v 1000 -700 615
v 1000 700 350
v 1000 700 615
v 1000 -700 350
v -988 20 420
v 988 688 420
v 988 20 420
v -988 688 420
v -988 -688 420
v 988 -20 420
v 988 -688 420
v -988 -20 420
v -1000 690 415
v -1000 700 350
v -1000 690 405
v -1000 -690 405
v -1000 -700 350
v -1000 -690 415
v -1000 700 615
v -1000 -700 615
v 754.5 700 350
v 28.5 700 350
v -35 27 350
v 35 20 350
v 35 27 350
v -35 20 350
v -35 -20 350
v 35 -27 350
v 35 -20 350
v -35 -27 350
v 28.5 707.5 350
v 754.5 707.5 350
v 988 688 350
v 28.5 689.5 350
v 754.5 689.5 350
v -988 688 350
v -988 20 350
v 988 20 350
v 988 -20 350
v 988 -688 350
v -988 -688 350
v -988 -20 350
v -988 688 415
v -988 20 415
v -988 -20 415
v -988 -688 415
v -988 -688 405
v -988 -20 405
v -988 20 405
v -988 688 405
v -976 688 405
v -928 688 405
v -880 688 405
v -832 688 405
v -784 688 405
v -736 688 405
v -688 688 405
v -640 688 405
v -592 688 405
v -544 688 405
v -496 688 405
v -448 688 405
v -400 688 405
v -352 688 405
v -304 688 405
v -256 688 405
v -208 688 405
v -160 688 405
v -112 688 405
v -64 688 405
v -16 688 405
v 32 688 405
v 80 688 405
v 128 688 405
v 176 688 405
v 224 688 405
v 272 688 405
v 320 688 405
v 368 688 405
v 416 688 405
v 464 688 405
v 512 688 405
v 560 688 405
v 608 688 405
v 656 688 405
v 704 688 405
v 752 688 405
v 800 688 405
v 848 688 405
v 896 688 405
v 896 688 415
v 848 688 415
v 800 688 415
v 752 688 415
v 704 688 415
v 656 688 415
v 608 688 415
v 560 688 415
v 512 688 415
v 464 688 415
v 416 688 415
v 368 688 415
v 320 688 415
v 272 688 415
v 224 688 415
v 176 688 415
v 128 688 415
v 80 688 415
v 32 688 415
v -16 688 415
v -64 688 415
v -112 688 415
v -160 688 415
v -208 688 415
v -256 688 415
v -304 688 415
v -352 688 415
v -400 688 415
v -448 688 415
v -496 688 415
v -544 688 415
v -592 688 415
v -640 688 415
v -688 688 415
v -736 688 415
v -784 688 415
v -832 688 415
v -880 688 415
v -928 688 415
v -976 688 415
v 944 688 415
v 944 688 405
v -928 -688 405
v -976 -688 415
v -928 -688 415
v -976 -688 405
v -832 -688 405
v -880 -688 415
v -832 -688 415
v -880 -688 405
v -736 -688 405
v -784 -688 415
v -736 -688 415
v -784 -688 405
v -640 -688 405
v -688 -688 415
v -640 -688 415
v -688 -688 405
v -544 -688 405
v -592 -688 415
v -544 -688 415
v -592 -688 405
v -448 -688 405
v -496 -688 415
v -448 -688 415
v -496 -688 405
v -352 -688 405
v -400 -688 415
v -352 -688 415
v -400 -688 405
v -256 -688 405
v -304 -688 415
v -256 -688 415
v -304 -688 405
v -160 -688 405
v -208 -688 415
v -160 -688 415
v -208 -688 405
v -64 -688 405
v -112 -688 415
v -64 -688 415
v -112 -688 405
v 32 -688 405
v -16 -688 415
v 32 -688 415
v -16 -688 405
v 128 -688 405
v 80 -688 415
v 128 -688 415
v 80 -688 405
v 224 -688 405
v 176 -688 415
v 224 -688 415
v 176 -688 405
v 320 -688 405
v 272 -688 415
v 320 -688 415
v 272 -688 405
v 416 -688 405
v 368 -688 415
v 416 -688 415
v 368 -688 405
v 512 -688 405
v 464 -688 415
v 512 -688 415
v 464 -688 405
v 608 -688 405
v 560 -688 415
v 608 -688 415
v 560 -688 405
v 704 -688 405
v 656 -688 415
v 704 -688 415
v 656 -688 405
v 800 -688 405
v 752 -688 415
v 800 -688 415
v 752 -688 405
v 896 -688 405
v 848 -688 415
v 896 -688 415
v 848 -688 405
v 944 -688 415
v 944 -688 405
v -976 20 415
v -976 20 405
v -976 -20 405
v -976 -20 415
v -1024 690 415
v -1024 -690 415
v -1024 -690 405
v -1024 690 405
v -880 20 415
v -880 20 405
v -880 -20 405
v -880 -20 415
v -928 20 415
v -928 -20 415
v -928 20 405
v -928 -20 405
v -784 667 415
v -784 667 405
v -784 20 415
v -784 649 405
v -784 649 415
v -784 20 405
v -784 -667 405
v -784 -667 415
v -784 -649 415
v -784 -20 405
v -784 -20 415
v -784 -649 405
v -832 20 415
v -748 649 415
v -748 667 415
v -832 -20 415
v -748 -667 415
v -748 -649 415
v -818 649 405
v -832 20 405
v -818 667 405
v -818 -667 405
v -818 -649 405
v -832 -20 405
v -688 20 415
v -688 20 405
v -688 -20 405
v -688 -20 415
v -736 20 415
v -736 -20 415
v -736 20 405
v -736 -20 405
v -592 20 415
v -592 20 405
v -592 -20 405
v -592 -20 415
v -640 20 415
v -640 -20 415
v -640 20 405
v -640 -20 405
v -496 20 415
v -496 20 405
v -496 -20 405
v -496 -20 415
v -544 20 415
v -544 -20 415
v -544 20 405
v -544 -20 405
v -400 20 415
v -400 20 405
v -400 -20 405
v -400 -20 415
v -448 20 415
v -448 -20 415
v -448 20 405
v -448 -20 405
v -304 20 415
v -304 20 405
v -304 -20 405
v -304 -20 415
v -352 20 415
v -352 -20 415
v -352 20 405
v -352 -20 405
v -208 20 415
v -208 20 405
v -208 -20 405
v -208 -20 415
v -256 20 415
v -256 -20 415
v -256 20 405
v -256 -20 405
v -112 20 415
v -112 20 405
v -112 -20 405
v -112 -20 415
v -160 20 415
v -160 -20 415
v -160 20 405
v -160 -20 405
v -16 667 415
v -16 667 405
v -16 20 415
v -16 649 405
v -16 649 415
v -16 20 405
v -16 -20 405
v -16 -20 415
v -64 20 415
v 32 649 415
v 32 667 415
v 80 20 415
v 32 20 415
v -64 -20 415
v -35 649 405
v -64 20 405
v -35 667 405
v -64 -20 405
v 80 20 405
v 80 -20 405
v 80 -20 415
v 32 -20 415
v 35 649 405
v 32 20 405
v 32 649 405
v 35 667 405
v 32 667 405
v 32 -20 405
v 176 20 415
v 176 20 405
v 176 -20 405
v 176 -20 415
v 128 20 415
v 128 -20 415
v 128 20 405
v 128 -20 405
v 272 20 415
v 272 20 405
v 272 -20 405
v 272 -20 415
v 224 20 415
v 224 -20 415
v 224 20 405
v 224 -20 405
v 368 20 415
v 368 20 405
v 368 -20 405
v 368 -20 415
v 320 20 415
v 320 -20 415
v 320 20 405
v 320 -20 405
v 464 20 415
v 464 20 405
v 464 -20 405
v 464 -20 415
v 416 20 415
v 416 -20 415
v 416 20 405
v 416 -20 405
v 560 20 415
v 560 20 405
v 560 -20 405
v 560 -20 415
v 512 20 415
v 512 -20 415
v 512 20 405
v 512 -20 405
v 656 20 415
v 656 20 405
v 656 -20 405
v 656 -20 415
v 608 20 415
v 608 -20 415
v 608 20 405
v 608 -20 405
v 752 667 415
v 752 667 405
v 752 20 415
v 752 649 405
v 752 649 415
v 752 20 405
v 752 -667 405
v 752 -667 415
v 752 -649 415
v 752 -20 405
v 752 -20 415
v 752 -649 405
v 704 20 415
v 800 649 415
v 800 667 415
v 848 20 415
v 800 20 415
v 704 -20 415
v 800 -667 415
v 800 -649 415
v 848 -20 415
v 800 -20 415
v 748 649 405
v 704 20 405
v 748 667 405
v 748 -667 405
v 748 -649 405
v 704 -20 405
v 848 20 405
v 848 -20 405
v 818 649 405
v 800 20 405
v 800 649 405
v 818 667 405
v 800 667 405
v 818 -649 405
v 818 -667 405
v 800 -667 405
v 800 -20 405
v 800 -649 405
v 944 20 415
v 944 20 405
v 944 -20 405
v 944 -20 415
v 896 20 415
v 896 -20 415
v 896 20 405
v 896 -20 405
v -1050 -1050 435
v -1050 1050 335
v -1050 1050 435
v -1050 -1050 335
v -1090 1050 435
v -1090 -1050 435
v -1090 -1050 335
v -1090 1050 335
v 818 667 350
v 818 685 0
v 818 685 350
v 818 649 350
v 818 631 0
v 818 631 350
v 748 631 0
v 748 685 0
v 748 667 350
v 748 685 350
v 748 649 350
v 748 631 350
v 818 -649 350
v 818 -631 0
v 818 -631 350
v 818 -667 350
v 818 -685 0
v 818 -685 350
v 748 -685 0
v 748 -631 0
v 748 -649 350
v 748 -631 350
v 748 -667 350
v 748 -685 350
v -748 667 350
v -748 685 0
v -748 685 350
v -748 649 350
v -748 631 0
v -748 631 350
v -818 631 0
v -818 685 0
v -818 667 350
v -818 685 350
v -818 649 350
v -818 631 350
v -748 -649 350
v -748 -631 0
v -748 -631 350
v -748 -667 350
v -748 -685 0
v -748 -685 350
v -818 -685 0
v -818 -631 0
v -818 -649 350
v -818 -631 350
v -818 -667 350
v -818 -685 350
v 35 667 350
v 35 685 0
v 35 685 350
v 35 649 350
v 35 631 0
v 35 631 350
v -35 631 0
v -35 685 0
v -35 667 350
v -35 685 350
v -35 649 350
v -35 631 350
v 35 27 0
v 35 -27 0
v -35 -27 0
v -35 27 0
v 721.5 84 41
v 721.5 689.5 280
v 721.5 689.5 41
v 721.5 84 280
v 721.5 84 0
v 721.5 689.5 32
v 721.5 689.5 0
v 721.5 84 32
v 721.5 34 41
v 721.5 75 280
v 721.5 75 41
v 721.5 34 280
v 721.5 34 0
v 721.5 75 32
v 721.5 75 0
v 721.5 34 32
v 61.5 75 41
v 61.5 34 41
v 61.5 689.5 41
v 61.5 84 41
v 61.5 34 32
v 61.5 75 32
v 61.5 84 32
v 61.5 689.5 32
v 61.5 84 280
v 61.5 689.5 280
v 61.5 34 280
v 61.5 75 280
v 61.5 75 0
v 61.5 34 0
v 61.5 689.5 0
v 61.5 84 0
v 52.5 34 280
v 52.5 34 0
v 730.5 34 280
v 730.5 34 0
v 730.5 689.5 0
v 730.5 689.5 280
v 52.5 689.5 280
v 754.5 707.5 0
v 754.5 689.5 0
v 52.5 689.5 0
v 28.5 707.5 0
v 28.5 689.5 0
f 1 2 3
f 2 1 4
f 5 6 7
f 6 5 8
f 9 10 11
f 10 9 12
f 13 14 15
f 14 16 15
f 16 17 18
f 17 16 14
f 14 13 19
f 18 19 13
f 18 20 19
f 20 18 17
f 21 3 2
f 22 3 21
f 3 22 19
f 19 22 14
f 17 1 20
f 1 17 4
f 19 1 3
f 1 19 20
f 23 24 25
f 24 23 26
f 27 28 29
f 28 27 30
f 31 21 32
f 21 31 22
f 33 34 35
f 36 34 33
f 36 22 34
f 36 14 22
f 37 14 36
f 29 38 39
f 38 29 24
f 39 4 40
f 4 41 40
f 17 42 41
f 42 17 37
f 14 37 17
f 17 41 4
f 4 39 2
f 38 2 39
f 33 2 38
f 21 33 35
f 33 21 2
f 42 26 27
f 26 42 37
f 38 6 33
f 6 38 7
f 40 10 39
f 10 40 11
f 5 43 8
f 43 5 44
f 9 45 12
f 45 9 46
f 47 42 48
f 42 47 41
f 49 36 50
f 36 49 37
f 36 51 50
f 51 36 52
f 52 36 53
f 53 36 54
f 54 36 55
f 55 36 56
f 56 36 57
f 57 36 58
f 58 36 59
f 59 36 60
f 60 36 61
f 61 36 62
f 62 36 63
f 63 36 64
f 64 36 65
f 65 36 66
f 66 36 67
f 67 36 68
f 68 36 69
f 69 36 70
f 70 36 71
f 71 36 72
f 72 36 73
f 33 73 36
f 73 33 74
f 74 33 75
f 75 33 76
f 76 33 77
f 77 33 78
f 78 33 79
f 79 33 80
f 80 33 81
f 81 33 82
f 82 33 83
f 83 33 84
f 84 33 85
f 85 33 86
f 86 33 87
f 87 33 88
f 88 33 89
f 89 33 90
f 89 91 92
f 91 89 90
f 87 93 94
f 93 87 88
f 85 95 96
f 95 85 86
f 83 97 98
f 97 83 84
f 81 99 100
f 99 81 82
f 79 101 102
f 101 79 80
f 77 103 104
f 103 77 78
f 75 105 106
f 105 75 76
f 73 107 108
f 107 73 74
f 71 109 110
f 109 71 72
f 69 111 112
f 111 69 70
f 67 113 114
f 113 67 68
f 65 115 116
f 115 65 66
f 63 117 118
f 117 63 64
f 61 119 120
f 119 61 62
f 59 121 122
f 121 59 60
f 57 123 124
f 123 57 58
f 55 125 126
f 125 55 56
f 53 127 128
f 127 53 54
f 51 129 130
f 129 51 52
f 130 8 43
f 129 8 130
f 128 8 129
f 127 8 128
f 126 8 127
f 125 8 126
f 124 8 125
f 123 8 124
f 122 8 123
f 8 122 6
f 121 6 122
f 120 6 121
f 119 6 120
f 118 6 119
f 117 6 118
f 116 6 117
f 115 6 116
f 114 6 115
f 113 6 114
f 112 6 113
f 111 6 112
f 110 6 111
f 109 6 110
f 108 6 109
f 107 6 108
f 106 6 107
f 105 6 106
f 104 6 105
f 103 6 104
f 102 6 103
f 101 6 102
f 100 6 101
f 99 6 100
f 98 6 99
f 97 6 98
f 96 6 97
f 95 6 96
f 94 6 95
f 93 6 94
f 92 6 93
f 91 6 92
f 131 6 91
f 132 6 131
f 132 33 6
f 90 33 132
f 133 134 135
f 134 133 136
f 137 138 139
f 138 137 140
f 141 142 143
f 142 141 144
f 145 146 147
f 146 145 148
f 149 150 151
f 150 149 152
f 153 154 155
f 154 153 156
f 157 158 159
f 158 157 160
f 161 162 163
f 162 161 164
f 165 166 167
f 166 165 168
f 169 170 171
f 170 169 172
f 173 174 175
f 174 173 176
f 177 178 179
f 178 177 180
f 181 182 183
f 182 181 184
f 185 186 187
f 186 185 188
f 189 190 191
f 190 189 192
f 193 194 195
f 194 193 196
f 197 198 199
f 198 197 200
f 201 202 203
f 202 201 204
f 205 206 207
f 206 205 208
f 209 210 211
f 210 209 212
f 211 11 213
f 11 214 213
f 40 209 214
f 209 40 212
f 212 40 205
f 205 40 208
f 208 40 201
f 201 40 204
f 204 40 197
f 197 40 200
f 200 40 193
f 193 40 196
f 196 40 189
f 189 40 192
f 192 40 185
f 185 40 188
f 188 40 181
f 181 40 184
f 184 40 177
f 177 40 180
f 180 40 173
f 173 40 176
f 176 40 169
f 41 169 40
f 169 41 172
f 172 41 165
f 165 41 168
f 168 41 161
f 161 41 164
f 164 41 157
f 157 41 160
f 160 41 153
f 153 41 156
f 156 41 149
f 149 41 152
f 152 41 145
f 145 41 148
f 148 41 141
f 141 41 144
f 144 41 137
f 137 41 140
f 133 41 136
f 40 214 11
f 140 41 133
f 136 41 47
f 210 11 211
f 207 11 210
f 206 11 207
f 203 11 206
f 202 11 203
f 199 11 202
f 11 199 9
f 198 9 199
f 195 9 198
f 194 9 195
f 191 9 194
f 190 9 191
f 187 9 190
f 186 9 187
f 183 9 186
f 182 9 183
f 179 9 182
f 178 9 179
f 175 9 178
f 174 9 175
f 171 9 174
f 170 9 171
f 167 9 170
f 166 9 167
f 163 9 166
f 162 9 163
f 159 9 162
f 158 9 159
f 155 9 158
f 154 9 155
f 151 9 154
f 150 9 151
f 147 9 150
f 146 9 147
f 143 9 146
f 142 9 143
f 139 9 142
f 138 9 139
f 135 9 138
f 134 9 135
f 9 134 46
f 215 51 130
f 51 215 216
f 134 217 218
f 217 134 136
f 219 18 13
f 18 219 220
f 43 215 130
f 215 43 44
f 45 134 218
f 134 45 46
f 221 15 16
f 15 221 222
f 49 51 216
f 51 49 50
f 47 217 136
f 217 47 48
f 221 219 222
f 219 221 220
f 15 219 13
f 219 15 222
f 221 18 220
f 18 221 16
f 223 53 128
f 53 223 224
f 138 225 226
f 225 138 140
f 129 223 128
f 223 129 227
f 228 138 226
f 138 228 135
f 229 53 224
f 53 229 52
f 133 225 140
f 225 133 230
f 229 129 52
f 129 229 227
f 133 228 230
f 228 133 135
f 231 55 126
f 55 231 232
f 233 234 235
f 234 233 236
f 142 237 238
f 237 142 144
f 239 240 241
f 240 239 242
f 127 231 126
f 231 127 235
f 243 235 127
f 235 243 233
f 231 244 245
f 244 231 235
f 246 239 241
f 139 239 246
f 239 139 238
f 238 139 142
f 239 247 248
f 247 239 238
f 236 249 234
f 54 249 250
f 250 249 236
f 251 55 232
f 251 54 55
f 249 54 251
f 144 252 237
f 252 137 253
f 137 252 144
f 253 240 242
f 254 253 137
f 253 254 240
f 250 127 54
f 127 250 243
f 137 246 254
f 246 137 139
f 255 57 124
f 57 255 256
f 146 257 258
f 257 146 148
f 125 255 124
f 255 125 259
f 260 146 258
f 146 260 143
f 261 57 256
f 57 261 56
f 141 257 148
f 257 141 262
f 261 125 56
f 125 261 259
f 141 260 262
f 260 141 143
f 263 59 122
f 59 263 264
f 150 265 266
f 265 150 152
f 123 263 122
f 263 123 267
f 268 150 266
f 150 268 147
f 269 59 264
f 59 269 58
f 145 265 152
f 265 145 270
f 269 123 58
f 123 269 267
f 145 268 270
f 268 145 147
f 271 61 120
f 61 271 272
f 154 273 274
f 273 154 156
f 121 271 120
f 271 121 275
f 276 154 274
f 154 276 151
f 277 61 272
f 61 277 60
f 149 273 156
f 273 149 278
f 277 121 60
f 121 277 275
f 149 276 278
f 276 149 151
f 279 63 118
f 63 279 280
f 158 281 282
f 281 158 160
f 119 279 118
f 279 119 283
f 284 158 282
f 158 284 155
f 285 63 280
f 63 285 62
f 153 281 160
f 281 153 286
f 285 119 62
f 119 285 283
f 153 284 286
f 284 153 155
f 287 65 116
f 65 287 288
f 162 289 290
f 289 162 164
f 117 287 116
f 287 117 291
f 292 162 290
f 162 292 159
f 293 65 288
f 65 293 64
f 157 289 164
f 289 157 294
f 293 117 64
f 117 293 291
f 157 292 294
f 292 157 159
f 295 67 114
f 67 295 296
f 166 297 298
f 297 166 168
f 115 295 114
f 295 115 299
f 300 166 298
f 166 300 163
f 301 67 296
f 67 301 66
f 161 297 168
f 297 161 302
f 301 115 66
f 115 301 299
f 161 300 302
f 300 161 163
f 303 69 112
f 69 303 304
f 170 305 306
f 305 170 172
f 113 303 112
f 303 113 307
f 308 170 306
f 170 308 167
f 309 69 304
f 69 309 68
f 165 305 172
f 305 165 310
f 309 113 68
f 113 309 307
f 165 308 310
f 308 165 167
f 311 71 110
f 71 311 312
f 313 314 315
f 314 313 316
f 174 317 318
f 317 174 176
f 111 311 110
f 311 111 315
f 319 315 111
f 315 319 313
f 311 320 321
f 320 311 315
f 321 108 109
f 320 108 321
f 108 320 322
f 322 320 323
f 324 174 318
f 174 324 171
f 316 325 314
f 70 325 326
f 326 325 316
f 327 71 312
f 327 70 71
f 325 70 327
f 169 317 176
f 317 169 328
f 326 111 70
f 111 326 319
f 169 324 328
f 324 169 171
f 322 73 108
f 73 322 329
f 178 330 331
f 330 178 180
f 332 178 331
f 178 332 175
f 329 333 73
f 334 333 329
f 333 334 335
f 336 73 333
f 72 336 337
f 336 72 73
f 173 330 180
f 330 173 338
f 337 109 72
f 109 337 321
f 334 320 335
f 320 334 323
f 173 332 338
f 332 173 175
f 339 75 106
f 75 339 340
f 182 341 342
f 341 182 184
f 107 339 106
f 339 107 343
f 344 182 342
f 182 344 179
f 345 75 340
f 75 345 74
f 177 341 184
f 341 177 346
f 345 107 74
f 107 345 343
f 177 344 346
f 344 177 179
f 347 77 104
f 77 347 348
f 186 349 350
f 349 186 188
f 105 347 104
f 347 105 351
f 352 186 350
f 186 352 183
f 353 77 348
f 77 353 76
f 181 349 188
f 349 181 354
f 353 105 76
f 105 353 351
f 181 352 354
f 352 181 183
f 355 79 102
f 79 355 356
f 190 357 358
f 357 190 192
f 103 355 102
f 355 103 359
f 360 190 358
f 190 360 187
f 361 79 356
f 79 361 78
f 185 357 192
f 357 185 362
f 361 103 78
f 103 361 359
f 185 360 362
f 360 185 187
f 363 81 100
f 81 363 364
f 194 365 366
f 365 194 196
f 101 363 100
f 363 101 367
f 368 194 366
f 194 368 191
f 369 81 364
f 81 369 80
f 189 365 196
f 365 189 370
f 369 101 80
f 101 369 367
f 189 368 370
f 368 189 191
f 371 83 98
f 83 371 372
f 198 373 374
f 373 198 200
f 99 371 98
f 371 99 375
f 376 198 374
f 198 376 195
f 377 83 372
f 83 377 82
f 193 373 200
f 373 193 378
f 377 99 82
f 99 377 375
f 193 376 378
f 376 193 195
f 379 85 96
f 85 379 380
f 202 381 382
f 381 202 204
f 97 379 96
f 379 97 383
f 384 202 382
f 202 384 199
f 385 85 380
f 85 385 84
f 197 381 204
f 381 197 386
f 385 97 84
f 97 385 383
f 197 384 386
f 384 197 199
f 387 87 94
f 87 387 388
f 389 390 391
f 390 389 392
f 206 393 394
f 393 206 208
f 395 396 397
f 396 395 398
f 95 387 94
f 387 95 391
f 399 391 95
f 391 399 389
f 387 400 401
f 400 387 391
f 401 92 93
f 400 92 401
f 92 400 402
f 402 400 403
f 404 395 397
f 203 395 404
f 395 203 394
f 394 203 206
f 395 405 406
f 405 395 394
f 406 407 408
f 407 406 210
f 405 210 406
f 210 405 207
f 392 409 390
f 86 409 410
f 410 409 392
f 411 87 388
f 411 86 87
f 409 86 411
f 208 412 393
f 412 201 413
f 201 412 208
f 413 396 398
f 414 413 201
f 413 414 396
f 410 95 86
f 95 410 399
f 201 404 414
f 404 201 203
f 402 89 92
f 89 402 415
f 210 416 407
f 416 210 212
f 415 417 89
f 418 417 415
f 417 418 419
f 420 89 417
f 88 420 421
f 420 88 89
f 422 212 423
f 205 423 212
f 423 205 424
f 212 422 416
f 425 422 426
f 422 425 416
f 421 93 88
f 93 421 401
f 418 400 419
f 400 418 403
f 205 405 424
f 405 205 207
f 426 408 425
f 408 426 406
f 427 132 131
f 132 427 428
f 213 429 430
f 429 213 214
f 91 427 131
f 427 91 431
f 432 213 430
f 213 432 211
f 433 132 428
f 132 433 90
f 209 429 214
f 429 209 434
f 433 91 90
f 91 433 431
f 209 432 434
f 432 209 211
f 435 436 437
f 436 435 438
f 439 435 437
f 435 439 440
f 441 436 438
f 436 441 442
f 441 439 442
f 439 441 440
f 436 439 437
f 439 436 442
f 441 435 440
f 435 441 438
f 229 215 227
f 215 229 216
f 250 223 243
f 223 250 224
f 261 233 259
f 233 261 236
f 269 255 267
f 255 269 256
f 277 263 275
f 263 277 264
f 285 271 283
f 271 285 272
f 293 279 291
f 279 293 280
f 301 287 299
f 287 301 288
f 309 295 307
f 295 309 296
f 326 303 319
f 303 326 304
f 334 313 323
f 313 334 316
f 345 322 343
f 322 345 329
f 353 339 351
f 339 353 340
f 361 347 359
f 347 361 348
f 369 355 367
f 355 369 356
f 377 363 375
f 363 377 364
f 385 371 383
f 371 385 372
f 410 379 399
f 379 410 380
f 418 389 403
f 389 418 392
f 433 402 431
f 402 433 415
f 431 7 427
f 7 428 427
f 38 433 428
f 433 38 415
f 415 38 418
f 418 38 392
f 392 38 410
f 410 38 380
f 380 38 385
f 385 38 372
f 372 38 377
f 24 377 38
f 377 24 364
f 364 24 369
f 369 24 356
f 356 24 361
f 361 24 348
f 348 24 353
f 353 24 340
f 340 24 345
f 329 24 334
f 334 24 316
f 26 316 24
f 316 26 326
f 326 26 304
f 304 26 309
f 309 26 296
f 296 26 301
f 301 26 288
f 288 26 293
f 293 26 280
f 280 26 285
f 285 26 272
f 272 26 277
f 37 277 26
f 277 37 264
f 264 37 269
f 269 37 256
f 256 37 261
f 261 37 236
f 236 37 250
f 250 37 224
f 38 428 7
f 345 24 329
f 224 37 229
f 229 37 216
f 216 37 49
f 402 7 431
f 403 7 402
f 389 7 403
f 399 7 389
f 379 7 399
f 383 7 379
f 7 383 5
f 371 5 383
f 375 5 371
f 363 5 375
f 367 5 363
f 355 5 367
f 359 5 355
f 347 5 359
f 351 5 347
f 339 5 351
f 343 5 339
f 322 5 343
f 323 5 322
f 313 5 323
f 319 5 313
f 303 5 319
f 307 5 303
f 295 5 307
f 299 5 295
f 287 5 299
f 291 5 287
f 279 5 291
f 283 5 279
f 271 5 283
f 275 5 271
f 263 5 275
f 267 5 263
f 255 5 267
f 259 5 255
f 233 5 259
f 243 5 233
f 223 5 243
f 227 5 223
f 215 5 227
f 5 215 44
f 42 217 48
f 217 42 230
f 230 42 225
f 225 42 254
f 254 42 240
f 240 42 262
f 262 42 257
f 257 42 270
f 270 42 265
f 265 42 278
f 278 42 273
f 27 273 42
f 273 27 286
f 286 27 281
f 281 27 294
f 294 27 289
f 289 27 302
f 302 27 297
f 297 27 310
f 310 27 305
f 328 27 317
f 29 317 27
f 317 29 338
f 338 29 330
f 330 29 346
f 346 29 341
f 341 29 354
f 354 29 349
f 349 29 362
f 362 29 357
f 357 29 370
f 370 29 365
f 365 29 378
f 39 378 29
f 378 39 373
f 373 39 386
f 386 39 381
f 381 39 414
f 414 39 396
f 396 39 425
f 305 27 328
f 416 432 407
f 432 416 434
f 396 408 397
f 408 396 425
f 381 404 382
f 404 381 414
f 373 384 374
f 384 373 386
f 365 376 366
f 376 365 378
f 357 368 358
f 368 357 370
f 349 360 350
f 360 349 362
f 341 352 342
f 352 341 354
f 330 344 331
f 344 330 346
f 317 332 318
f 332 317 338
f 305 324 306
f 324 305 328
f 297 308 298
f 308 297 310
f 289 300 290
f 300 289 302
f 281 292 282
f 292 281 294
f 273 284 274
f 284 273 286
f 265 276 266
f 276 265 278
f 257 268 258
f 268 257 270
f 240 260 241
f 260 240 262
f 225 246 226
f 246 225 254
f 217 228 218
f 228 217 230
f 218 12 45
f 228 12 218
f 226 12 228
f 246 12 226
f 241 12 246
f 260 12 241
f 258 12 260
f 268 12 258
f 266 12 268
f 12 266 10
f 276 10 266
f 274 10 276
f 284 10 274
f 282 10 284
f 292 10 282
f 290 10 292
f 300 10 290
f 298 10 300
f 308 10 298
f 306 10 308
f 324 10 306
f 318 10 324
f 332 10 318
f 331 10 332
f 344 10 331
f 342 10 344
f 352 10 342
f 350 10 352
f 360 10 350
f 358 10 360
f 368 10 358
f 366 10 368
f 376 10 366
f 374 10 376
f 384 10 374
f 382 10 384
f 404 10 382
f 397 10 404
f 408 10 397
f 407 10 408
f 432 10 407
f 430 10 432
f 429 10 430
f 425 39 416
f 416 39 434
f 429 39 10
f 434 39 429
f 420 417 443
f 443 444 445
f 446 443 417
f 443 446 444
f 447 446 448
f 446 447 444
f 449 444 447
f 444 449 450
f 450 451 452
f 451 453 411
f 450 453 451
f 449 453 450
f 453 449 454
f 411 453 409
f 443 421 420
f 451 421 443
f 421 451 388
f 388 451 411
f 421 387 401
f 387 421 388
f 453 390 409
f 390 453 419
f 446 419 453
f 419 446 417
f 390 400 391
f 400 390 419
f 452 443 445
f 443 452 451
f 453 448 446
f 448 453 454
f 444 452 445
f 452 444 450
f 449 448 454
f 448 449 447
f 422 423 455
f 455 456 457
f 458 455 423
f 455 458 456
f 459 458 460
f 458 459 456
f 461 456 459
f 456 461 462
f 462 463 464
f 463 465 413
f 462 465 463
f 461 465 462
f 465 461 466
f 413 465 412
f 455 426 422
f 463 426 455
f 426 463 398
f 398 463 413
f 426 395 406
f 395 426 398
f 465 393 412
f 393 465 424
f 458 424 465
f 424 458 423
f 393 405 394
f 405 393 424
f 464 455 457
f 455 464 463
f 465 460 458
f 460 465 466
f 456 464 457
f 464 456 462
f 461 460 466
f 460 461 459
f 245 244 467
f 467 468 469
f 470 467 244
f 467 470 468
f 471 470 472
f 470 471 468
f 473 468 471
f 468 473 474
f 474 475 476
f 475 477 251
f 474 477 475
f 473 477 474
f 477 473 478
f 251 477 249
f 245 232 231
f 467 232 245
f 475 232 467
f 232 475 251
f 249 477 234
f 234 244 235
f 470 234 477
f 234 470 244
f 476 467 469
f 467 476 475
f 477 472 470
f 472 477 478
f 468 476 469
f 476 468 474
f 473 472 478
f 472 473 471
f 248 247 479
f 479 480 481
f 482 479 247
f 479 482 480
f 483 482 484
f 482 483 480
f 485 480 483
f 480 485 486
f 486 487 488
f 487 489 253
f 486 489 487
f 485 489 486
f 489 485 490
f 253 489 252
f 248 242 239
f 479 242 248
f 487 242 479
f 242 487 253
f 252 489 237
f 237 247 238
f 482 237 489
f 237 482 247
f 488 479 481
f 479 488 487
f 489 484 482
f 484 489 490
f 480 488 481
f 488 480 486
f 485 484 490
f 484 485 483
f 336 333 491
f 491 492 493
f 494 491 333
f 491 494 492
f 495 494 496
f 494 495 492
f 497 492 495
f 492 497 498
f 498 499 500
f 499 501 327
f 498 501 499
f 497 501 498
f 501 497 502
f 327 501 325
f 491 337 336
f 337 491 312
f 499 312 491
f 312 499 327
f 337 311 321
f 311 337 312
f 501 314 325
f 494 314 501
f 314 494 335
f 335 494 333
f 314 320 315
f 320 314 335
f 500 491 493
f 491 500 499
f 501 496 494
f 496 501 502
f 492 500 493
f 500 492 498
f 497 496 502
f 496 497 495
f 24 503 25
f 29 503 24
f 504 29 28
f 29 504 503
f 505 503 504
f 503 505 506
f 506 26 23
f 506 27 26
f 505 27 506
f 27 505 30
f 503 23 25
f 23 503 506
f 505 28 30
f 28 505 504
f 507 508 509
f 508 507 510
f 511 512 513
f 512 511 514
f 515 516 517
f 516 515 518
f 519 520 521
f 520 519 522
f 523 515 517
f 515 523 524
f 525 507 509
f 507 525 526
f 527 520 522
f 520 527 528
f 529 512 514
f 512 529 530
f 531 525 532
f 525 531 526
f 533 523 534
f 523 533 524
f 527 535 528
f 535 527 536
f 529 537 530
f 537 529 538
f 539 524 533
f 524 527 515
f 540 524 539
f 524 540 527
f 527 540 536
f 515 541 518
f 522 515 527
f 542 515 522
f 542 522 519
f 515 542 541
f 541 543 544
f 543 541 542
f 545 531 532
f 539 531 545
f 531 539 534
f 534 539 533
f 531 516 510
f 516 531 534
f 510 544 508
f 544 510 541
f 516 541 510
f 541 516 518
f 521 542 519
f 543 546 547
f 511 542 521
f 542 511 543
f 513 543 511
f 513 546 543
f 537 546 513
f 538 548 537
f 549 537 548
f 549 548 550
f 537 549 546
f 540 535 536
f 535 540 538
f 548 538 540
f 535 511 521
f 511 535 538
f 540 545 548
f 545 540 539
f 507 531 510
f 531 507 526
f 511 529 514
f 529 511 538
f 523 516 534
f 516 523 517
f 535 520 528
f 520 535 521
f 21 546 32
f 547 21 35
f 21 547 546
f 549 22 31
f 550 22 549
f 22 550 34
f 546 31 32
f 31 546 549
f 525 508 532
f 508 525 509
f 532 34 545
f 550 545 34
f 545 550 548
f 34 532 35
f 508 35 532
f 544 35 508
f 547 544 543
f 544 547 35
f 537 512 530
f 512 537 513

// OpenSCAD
l_ramme = 2000; //målt
b_ramme = 1400; //målt
h_ramme = 70; //målt

finer_t = 9;
eik_t = 18;

h_over_bakke_idag = 200;
h_over_bakken = h_over_bakke_idag + 150;

module seng() {
  //Madrass
  h_madrass = 140; //målt
  h_overmadrass = 60; //målt
  
  translate([0,0,h_ramme/2]){
      translate([0,0,h_ramme/2+h_madrass/2]){
        color("DarkGray", 0.2){ 
          cube([l_ramme, b_ramme, h_madrass], center=true);
          }
          translate([0,0,h_ramme/2+h_overmadrass]){
            color("Brown", 0.2) {
              cube([l_ramme, b_ramme, h_overmadrass], center=true);
              }
          }
      }
    
    
    difference(){
      cube([l_ramme, b_ramme, h_ramme], center=true);
      cube([l_ramme-2*12, b_ramme-2*12, h_ramme+2], center=true);
    }
    
    //Vegg
      translate([-l_ramme/2-70,0,0]){
      cube([40, b_ramme*1.5, 100], center=true);
      }
    
    //Midt stender lang
    cube([l_ramme-2*12, 40, h_ramme], center=true);
    
    //Riller
    b_riller = 48;
    for(i = [-l_ramme/2 : b_riller*2.0 : l_ramme/2]){
      translate([i, 0, h_ramme/2-10]){
        cube([b_riller, b_ramme-20, 10], center=true);
      }
    }
  }
}

module skuff(l,b,h) {
  //17 mm bygghøyde hjul under skuff
  // lag skuff av tynn finer, forsterk med feks hylleplate 15mm
  translate([0,0,h/2]){
    difference(){
      cube([b, l, h], center=true);
      
      translate([0,0,5]) cube([b-2*5, l+2, h], center=true);
    }
  }
}

module skuff2(l,b,h) {
  //17 mm bygghøyde hjul under skuff
  // lag skuff av tynn finer, forsterk med feks hylleplate 15mm
  
  color("DarkGray", 0.5){ 
  
  h=250;
  
  h_vegg=280;
  
  h_hjul = 35-3; //bygghøyde 35, så må hjulene stikke ute noen mm
  //bunn
  translate([0,0,finer_t/2+h_hjul]) cube([b, l, finer_t], center=true);
  
  //vegger 
  translate([b/2+finer_t/2,0,h_vegg/2]) cube([finer_t, l, h_vegg], center=true);
  translate([-(b/2+finer_t/2),0,h_vegg/2]) cube([finer_t, l, h_vegg], center=true);
    
  //bak 
  translate([0,-(l/2+finer_t/2-50),h_vegg/2]) cube([b, finer_t, h_vegg], center=true);
  
  //front
    front_bredde = b*1.1;
  translate([0,l/2+finer_t/2,h_over_bakken/2]) cube([front_bredde, eik_t, h_over_bakken], center=true);
  }
}





/********** SENG ramme + madrass ***************/
translate([0,0,h_over_bakken]){
  seng();
}

/********** STØTTE BEN ***************/
x=190; //avstanden fra kortsiden til der beina starter
b_t = 3*eik_t;//65;
b_b = 70;
b_i = b_t/2+15; //15: hvor langt inn beina er satt i forhold til rammen

module bein(x,y) {
  color("Brown", 0.6) {
  translate([x,y,h_over_bakken/2]){
    translate([0,0,65/2]) cube([b_b, b_t/3, h_over_bakken+65], center=true);
     cube([b_b, b_t, h_over_bakken], center=true);
  }
}
}

bein(l_ramme/2-x-b_t/2, b_ramme/2-b_i);
bein(l_ramme/2-x-b_t/2, -(b_ramme/2-b_i));
bein(-(l_ramme/2-x-b_t/2), b_ramme/2-b_i);
bein(-(l_ramme/2-x-b_t/2), -(b_ramme/2-b_i));

bein(0, b_ramme/2-b_i);
bein(0, 0);

b_skuff = 660;
d_skuff = b_skuff; //600;

/********** SKUFFER ***************/
h_hjul = 17;

translate([(l_ramme/2-x-b_t/2)/2,(d_skuff+eik_t)/2+25,0]){ //700/2+b_t/2, b_ramme/4+40,0
  skuff2(d_skuff, b_skuff, h_over_bakken-50);
  //skuff(d_skuff, b_skuff, h_over_bakken-50);
}

/*
translate([-(700/2+b_t/2), b_ramme/4+40]){
  skuff2(d_skuff, b_skuff, h_over_bakken-50);
}
*/
